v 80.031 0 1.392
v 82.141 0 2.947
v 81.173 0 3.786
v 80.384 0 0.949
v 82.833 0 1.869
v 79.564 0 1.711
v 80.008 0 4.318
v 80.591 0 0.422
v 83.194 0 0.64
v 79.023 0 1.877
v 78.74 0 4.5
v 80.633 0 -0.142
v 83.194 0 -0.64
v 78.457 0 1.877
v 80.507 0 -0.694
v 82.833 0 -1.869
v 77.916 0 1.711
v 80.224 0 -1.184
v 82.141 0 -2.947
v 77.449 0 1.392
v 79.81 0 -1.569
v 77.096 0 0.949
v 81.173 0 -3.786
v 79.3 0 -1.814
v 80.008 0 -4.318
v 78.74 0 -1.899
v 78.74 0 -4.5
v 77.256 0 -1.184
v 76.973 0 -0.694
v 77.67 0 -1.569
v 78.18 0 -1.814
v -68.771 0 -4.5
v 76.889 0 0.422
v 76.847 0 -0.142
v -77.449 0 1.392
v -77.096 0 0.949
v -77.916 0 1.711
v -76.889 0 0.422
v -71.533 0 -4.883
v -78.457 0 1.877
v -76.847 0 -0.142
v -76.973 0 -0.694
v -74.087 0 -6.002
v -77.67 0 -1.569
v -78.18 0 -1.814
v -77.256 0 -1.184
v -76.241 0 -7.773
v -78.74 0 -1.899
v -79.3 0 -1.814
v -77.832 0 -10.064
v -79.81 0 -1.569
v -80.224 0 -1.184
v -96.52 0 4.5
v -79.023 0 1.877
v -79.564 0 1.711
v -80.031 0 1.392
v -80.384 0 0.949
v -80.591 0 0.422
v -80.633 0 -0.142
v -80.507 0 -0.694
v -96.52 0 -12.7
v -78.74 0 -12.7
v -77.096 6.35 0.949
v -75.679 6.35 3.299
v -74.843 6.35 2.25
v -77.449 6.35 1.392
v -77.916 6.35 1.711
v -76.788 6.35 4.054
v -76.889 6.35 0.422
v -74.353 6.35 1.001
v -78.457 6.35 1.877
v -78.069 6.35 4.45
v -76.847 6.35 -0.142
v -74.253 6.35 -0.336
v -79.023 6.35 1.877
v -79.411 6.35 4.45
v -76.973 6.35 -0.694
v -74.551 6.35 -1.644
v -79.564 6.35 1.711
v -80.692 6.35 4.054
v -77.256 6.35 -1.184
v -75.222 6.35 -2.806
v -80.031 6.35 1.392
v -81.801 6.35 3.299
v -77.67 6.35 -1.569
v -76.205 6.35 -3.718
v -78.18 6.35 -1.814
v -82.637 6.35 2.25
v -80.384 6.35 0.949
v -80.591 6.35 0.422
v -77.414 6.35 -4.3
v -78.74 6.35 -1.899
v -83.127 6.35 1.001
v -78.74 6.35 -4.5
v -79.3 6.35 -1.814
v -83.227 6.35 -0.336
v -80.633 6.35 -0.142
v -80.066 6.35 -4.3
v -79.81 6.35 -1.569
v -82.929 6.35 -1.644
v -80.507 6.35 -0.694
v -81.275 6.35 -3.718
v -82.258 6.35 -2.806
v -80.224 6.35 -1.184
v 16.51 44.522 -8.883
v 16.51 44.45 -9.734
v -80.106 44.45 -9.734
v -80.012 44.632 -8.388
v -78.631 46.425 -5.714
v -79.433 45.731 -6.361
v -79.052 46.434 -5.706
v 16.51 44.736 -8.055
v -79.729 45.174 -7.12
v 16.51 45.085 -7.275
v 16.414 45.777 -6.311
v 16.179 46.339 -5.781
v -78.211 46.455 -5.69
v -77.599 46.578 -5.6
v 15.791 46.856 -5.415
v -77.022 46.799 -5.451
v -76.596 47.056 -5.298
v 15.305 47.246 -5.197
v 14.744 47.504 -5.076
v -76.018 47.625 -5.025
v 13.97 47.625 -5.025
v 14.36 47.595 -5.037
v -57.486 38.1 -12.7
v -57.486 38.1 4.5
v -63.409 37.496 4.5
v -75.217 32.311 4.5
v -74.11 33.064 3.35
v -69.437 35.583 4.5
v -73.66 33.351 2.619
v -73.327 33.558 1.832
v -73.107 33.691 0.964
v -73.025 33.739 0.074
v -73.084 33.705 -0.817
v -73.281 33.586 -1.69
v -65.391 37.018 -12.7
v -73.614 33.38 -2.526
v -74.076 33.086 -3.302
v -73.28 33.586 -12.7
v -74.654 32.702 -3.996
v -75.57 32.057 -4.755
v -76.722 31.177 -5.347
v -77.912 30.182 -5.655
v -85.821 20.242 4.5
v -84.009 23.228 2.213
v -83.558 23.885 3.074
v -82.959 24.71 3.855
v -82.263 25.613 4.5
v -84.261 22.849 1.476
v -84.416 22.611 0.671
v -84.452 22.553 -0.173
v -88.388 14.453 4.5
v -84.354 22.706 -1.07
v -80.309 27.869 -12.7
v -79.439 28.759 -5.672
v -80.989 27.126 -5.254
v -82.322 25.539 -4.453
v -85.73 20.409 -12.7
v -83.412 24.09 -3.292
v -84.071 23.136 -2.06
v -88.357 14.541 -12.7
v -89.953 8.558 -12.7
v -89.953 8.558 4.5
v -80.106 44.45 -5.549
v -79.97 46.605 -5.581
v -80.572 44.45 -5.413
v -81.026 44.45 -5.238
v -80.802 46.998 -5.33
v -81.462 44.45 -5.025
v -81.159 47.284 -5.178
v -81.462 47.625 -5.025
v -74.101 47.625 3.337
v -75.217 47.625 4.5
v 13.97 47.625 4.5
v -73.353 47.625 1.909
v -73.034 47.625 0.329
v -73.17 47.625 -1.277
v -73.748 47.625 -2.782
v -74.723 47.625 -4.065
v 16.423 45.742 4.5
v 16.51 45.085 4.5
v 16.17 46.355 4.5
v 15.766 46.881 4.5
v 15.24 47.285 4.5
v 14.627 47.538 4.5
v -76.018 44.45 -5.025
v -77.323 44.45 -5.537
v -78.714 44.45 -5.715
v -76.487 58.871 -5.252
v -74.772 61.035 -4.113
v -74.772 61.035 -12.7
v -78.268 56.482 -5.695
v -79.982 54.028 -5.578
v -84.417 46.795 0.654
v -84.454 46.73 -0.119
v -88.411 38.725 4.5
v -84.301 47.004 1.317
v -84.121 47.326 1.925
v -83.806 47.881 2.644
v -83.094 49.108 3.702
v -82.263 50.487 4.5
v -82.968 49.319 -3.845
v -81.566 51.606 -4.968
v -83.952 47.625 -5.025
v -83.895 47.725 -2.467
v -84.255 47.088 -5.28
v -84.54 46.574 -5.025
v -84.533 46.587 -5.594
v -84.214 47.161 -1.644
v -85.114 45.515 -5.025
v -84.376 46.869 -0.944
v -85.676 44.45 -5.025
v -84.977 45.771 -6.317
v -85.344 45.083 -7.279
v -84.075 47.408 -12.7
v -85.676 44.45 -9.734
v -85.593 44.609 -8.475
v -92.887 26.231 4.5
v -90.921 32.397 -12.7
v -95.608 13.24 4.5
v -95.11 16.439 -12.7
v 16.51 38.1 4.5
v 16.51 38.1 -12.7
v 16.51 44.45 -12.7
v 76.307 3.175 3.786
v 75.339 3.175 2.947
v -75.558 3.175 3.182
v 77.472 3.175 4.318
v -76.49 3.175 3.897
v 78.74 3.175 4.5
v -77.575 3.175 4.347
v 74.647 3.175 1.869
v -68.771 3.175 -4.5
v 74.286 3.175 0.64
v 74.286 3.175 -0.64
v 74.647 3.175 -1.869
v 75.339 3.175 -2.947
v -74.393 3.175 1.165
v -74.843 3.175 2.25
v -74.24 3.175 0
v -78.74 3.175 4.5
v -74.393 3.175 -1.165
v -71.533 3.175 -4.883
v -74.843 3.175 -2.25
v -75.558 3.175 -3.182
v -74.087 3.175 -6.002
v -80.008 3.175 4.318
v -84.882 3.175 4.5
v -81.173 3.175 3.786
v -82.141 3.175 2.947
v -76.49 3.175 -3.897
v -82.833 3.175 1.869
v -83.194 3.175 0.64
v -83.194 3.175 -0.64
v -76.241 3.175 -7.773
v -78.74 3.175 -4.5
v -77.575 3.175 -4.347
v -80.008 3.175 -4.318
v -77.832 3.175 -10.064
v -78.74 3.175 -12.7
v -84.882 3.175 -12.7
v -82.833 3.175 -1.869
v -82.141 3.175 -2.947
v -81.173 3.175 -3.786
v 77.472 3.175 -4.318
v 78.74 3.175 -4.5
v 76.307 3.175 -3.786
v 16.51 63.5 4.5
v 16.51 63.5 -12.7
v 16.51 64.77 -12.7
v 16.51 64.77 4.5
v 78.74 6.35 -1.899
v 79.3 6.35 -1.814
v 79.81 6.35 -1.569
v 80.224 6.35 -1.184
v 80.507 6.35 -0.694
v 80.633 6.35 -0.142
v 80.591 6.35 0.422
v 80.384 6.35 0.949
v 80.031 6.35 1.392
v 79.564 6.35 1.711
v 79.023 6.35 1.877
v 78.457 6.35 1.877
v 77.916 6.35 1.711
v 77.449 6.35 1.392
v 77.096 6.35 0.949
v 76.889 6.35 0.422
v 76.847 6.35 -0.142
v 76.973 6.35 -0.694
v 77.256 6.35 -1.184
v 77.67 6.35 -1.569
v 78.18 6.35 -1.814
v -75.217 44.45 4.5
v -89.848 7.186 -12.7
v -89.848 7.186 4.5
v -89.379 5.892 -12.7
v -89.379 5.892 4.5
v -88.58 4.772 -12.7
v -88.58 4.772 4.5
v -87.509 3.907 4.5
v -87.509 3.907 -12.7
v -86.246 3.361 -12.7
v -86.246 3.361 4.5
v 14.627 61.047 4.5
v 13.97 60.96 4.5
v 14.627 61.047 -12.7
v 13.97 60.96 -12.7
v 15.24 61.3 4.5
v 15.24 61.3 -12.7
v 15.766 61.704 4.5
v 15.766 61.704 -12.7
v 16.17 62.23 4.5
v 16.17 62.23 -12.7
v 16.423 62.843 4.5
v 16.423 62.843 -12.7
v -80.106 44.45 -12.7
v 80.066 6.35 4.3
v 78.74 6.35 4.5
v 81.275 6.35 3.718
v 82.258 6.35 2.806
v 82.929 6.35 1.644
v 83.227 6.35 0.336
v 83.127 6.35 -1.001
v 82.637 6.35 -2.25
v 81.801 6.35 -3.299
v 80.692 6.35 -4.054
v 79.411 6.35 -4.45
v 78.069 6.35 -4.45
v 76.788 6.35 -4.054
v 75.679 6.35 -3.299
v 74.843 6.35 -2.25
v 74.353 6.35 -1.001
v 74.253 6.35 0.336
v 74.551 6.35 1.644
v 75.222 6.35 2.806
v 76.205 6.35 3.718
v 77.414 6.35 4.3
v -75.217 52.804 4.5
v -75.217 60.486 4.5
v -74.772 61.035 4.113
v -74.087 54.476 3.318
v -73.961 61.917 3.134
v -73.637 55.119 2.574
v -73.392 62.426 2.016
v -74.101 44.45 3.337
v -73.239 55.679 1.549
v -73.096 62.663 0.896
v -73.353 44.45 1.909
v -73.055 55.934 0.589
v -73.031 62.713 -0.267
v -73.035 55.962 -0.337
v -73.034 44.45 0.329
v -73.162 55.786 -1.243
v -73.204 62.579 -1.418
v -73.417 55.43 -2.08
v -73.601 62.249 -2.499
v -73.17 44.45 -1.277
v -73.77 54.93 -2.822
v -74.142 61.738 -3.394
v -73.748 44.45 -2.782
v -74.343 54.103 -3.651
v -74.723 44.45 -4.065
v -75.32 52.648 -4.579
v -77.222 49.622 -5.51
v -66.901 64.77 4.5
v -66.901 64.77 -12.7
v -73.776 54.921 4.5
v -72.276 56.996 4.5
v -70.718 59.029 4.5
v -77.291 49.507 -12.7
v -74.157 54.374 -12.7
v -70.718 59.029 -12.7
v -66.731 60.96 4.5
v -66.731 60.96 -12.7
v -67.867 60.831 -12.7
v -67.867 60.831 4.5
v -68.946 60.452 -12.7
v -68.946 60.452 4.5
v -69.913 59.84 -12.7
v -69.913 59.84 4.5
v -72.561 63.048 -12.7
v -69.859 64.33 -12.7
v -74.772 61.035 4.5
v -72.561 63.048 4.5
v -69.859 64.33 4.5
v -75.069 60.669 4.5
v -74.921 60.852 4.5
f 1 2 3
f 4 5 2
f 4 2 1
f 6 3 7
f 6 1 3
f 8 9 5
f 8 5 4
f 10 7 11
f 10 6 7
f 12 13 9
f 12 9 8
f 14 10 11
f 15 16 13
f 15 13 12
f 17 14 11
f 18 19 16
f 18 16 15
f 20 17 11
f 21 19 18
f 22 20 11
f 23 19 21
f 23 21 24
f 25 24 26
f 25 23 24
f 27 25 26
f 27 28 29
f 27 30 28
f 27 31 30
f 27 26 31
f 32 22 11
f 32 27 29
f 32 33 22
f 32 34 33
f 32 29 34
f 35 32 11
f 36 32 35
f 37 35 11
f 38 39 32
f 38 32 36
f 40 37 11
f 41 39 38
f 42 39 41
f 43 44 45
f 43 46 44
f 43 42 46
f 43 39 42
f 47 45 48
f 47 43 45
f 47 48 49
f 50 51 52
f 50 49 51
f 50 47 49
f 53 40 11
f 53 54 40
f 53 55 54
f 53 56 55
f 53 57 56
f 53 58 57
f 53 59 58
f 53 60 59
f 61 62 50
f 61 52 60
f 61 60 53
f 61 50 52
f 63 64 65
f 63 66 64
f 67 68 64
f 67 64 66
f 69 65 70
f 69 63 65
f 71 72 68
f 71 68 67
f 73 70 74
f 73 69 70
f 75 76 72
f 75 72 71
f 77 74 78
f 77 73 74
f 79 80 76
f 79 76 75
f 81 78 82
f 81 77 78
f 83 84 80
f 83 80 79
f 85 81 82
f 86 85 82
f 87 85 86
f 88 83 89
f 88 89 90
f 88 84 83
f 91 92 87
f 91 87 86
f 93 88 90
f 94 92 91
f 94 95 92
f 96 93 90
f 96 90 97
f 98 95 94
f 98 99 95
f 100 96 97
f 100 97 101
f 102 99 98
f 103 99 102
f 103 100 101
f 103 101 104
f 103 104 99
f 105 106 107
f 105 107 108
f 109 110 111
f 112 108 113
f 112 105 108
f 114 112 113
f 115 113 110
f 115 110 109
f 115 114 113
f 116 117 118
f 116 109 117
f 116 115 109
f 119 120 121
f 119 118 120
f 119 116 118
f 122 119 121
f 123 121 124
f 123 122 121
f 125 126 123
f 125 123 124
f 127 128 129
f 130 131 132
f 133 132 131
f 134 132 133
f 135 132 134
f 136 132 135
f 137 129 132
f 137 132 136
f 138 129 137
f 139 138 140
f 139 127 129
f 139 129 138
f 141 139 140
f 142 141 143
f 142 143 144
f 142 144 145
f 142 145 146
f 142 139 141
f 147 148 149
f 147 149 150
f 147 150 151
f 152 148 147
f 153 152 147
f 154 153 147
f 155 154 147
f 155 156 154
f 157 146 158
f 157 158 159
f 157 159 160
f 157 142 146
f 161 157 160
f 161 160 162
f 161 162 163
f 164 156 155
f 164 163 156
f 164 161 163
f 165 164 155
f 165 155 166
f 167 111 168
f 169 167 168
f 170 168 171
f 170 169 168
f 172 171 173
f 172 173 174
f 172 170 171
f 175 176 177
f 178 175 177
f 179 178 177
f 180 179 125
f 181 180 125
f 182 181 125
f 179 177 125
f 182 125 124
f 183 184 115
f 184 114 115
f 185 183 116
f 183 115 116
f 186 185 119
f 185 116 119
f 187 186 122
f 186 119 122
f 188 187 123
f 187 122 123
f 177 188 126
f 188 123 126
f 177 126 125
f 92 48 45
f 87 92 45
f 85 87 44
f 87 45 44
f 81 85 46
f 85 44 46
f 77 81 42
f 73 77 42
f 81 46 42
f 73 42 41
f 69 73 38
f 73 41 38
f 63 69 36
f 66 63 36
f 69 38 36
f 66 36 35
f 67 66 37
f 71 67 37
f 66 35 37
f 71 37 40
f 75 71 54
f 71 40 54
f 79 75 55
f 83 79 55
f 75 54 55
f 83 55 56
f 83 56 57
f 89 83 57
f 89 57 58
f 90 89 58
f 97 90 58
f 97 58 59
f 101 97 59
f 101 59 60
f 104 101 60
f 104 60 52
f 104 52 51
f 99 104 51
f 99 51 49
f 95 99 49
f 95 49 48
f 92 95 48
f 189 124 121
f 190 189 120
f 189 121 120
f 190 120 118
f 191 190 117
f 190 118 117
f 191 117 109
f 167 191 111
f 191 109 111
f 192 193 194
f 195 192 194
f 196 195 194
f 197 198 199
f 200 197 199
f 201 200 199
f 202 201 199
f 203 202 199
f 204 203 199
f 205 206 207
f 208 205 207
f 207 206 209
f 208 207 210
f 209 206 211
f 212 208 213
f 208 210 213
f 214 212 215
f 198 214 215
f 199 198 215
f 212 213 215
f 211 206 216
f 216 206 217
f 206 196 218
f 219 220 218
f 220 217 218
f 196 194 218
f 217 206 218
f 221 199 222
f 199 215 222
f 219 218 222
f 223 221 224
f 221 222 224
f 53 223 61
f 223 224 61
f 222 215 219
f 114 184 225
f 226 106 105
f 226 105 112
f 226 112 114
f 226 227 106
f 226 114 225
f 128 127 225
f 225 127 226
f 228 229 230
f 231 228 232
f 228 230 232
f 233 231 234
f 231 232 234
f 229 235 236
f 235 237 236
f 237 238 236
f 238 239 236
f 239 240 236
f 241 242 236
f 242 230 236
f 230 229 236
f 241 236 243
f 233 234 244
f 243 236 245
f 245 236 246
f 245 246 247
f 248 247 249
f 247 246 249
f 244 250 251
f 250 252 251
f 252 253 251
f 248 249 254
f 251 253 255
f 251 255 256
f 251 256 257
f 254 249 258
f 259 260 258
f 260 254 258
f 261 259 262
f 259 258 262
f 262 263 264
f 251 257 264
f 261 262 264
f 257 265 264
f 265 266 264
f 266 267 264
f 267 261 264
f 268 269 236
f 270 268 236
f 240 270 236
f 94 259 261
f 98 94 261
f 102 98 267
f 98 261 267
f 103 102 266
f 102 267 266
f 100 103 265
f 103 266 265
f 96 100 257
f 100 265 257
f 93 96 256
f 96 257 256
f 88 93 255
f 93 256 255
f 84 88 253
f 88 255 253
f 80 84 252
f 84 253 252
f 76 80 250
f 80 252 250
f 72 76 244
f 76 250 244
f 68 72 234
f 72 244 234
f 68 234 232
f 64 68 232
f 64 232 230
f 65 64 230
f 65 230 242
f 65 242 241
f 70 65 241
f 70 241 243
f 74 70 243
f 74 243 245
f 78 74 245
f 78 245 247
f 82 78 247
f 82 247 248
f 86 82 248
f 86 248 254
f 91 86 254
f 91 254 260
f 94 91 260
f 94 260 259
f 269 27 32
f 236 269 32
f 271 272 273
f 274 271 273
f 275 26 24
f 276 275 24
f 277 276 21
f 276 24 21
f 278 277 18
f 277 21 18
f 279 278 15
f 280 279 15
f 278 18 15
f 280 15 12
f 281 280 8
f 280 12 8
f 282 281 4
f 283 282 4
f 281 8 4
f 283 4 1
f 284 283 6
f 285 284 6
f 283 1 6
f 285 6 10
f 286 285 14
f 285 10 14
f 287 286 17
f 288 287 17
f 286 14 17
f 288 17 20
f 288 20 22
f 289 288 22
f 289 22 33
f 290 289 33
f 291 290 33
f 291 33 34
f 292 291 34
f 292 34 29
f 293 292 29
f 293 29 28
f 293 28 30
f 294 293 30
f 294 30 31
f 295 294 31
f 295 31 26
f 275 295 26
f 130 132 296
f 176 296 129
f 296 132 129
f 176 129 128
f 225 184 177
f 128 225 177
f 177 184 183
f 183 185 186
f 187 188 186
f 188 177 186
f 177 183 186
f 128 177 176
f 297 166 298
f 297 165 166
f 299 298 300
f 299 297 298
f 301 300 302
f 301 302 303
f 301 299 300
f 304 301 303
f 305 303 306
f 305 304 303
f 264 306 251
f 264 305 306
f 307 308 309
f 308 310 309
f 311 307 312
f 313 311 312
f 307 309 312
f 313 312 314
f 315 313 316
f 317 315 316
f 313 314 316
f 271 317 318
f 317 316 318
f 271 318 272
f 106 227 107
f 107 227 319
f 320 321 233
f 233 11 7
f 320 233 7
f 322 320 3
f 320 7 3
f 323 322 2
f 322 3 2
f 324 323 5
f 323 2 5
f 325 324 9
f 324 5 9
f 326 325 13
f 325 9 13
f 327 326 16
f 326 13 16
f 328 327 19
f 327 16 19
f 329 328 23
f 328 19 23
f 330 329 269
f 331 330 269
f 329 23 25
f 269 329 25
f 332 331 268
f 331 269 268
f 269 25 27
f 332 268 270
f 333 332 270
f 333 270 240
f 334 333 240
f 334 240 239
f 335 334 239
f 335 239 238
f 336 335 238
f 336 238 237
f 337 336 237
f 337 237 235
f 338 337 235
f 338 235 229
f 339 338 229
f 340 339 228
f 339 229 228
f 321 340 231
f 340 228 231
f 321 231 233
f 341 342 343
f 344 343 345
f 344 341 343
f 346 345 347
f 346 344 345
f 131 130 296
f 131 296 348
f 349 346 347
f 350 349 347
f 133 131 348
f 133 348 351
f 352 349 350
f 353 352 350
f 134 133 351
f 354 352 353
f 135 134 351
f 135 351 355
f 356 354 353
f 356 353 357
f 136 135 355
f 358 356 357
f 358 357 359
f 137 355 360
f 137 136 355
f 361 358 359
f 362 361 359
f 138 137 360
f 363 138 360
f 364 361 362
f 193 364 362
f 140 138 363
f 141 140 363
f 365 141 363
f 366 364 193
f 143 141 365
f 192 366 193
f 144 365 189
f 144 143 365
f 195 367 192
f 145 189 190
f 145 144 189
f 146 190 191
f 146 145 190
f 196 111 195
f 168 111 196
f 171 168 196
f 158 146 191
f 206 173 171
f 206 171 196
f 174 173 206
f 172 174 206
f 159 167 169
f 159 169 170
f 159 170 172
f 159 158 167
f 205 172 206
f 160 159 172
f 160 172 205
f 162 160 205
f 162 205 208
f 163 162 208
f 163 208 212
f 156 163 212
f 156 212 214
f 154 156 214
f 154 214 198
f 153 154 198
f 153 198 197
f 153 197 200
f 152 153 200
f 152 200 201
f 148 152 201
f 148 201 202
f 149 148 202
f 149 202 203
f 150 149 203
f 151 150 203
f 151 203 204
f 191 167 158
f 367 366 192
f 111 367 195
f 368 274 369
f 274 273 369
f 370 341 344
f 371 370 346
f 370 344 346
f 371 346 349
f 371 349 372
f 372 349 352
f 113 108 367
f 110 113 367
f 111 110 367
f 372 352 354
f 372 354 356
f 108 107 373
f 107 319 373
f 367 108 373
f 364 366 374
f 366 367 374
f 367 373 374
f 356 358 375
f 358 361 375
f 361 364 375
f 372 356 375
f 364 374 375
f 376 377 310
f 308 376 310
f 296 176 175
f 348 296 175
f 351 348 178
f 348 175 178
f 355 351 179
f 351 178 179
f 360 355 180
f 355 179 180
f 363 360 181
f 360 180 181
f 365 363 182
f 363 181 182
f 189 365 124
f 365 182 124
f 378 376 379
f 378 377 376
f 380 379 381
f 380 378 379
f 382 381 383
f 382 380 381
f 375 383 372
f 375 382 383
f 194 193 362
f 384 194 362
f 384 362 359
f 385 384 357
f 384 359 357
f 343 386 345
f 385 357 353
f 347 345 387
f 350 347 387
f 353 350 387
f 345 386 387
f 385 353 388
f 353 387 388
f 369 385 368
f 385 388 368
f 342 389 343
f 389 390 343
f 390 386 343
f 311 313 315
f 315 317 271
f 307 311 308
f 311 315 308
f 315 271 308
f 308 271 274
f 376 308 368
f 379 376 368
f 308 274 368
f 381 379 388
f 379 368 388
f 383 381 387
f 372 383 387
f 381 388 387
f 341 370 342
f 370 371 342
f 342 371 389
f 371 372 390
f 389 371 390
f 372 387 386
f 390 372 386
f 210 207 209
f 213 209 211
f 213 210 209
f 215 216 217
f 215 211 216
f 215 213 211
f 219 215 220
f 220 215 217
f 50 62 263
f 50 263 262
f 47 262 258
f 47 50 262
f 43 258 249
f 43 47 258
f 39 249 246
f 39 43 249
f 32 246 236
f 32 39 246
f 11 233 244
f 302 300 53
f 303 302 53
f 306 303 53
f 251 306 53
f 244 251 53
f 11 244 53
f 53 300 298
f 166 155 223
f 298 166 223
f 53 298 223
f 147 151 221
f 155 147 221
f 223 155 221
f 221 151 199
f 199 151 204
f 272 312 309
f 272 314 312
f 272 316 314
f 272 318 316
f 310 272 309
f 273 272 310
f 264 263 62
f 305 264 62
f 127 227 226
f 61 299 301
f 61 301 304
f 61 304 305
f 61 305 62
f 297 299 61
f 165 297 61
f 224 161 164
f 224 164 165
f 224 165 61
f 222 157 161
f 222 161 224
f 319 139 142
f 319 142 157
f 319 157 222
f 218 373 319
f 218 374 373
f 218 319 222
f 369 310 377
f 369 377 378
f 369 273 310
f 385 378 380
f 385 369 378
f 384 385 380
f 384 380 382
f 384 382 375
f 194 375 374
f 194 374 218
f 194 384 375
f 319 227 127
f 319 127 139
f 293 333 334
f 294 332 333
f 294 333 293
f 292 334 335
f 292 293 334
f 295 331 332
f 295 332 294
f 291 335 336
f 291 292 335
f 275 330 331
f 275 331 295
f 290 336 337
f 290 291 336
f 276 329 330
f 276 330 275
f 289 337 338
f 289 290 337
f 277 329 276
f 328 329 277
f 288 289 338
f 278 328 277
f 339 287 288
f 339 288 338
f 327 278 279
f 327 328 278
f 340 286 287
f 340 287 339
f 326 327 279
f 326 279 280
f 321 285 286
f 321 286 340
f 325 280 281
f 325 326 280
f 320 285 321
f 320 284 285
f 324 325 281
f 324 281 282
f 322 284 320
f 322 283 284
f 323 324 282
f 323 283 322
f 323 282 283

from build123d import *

# Parameters (mm, degrees)
SKETCH1_R                       = 4.5
BOSS_EXTRUDE1_DEPTH             = 6.35
BOSS_EXTRUDE1_2_DEPTH           = 6.35
BOSS_EXTRUDE2_DEPTH             = 3.175
BOSS_EXTRUDE3_DEPTH             = 12.7
BOSS_EXTRUDE3_DIRECTION_2_REACH = 85.603
FILLET1_R                       = 5.08
FILLET2_R                       = 10.16
F_6_CLEARANCE_HOLE1_D           = 3.7973
F_6_CLEARANCE_HOLE1_DEPTH       = 6.35
FILLET5_START                   = -12.7
FILLET5_DEPTH                   = 17.2
CUT_EXTRUDE1_START              = -56.211523666
CUT_EXTRUDE1_DEPTH              = 56.211523666
BOSS_EXTRUDE5_REACH             = 132.89
BOSS_EXTRUDE5_END_RADIUS        = 5.715
SKETCH8_W                       = 9.525
SKETCH8_H                       = 3.175
FILLET6_R                       = 5.08
FILLET7_R                       = 2.54


with BuildPart() as part:
    # Sketch1 → Boss-Extrude1 (new body)
    with BuildSketch(Plane(origin=(0, 0, 0), x_dir=(1, 0, 0), z_dir=(0, 1, 0))):
        with Locations(Location((78.74, 0, 0), (0, 0, 270))):
            Circle(SKETCH1_R)
    extrude(amount=BOSS_EXTRUDE1_DEPTH)



with BuildPart() as body_2:
    # Sketch1 → Boss-Extrude1 2 (new body)
    with BuildSketch(Plane(origin=(0, 0, 0), x_dir=(1, 0, 0), z_dir=(0, 1, 0))):
        with Locations(Location((-78.74, 0, 0), (0, 0, 90))):
            Circle(SKETCH1_R)
    extrude(amount=BOSS_EXTRUDE1_2_DEPTH)


with BuildPart() as part_1:
    add(part.part)

    add(body_2.part)  # Boss-Extrude2 merges body 2
    # Sketch2 → Boss-Extrude2 (add)
    with BuildSketch(Plane(origin=(0, 0, 0), x_dir=(1, 0, 0), z_dir=(0, 1, 0))):
        with BuildLine():
            Line((78.74, 4.5), (-78.74, 4.5))
            ThreePointArc((-78.74, 4.5), (-75.558019485, 3.181980515), (-74.24, 0))
            ThreePointArc((-74.24, 0), (-75.558019485, -3.181980515), (-78.74, -4.5))
            Line((-78.74, -4.5), (78.74, -4.5))
            ThreePointArc((78.74, -4.5), (74.24, 0), (78.74, 4.5))
        make_face()
    extrude(amount=BOSS_EXTRUDE2_DEPTH)

    # Sketch3 → Boss-Extrude3 (add)
    with BuildSketch(Plane.XY):
        with BuildLine():
            Line((-78.74, 0), (-78.74, 3.175))
            Line((-78.74, 3.175), (-90.114089339, 3.175))
            ThreePointArc((-90.114089339, 3.175), (-88.335814095, 20.989027697), (-83.071170469, 38.1))
            Line((-83.071170469, 38.1), (16.51, 38.1))
            Line((16.51, 38.1), (16.51, 44.45))
            Line((16.51, 44.45), (-80.105931514, 44.45))
            ThreePointArc((-80.105931514, 44.45), (-75.082403553, 53.007088382), (-69.148535375, 60.96))
            Line((-69.148535375, 60.96), (16.51, 60.96))
            Line((16.51, 60.96), (16.51, 64.77))
            Line((16.51, 64.77), (-71.560865702, 64.77))
            ThreePointArc((-71.560865702, 64.77), (-90.064324673, 34.70630809), (-96.52, 0))
            Line((-96.52, 0), (-78.74, 0))
        make_face()
    extrude(amount=-BOSS_EXTRUDE3_DEPTH)

    # Boss-Extrude3 direction 2: up to this face of the body (flat: up to its plane)
    boss_extrude3_direction_2_end = Plane(part_1.part.faces().sort_by_distance((0, 1.5875, 4.5))[0])
    # Sketch3 → Boss-Extrude3 direction 2 (add, up to the picked face)
    with BuildSketch(Plane.XY, mode=Mode.PRIVATE) as boss_extrude3_direction_2_sk1:
        with BuildLine():
            Line((-78.74, 0), (-78.74, 3.175))
            Line((-78.74, 3.175), (-90.114089339, 3.175))
            ThreePointArc((-90.114089339, 3.175), (-88.335814095, 20.989027697), (-83.071170469, 38.1))
            Line((-83.071170469, 38.1), (16.51, 38.1))
            Line((16.51, 38.1), (16.51, 44.45))
            Line((16.51, 44.45), (-80.105931514, 44.45))
            ThreePointArc((-80.105931514, 44.45), (-75.082403553, 53.007088382), (-69.148535375, 60.96))
            Line((-69.148535375, 60.96), (16.51, 60.96))
            Line((16.51, 60.96), (16.51, 64.77))
            Line((16.51, 64.77), (-71.560865702, 64.77))
            ThreePointArc((-71.560865702, 64.77), (-90.064324673, 34.70630809), (-96.52, 0))
            Line((-96.52, 0), (-78.74, 0))
        make_face()
    boss_extrude3_direction_2_tool1 = split(extrude(boss_extrude3_direction_2_sk1.sketch, amount=BOSS_EXTRUDE3_DIRECTION_2_REACH, mode=Mode.PRIVATE), bisect_by=boss_extrude3_direction_2_end, keep=Keep.BOTH, mode=Mode.PRIVATE)
    add(boss_extrude3_direction_2_tool1.solids().sort_by(Axis((-47.115631, 42.638129, 0), (0, 0, 1)))[0])

    # Fillet1
    fillet1_edges = [part_1.edges().sort_by_distance(p)[0] for p in [
        (-69.148535375, 60.96, -4.1),
        (-90.114089339, 3.175, -4.1),
    ]]
    fillet(fillet1_edges, radius=FILLET1_R)

    # Fillet2
    # the kernel refuses this fillet: 10.16 mm, written as the material it adds along each edge
    with BuildSketch(Plane(origin=(-78.74, 0, -4.5), x_dir=(1, 0, 0), z_dir=(0, 1, 0))) as fillet2_piece_1:
        with BuildLine():
            CenterArc((9.969152421, 10.16), FILLET2_R, 191.12285511, 78.87714489)
            Line((0, 8.2), (0, 0))
            Line((0, 0), (9.969152421, 0))
        make_face()
    extrude(amount=3.175)
    # the kernel refuses this fillet: 10.16 mm, written as the material it takes off along each edge
    with BuildSketch(Plane(origin=(-71.560865702, 64.77, 16.814827808), x_dir=(1, 0, 0), z_dir=(0, 0, -1))) as fillet2_2_piece_1:
        with BuildLine():
            CenterArc((4.659464371, 10.16), FILLET2_R, 219.223932399, 50.776067601)
            ThreePointArc((-3.211288726, 3.735294118), (-1.629477245, 1.847157571), (0, 0))
            Line((0, 0), (4.659464371, 0))
        make_face()
    extrude(amount=41.829655616, mode=Mode.SUBTRACT)

    # #6 Clearance Hole1
    with Locations(Plane(origin=(-78.74, 6.35, 0), x_dir=(0, 0, 1), z_dir=(0, 1, 0))):
        with Locations((0, 0), (0, 157.48)):
            Hole(F_6_CLEARANCE_HOLE1_D / 2, depth=F_6_CLEARANCE_HOLE1_DEPTH)

    # Fillet5: read off the stored shape, not the designer's step
    # Fillet5 outline → Fillet5 (add)
    with BuildSketch(Plane.XY.offset(FILLET5_START)):
        with BuildLine():
            add(Edge.make_bspline(
                [(-57.486261954, 38.1), (-84.476947832, 38.1), (-89.953142639, 8.558476434)],
                knots=[0, 0, 0, 1, 1, 1], degree=2, weights=[1, 0.768852264, 1]))
            Line((-57.486261954, 38.1), (-83.071170469, 38.1))
            ThreePointArc((-83.071170469, 38.1), (-87.76402471, 23.620872526), (-89.953142639, 8.558476434))
        make_face()
    extrude(amount=FILLET5_DEPTH)

    # Cut-Extrude1: read off the stored shape, not the designer's step
    # Cut-Extrude1 outline → Cut-Extrude1 (cut)
    with BuildSketch(Plane(origin=(0, 64.77, 0), x_dir=(1, 0, 0), z_dir=(0, 1, 0)).offset(CUT_EXTRUDE1_START)):
        with BuildLine():
            Line((-82.262956855, -4.5), (-75.217043145, -4.5))
            ThreePointArc((-75.217043145, -4.5), (-78.74, 5.715), (-82.262956855, -4.5))
        make_face()
    extrude(amount=CUT_EXTRUDE1_DEPTH, mode=Mode.SUBTRACT)

    # Boss-Extrude5: up to this cylinder (the profile starts outside it)
    boss_extrude5_end = Plane(origin=(-78.74, 46.0375, 0), z_dir=(0, 1, 0)) * Cylinder(BOSS_EXTRUDE5_END_RADIUS, 278.21, mode=Mode.PRIVATE)
    # Sketch8 → Boss-Extrude5 (add, up to the surface)
    with BuildSketch(Plane(origin=(16.51, 0, 0), x_dir=(0, 0, -1), z_dir=(1, 0, 0)), mode=Mode.PRIVATE) as boss_extrude5_sk1:
        with Locations((0.2625, 46.0375)):
            Rectangle(SKETCH8_W, SKETCH8_H)
    boss_extrude5_tool1 = extrude(boss_extrude5_sk1.sketch, amount=-BOSS_EXTRUDE5_REACH, mode=Mode.PRIVATE) - boss_extrude5_end
    add(boss_extrude5_tool1.solids().sort_by_distance((16.51, 46.0375, -0.2625))[0])

    # Fillet6
    # the kernel refuses this fillet: 5.08 mm, written as the material it adds along each edge
    with BuildSketch(Plane(origin=(16.51, 44.45, -5.025), x_dir=(0, 1, 0), z_dir=(-1, 0, 0))) as fillet6_piece_1_section:
        with BuildLine():
            CenterArc((5.08, 4.709286039), FILLET6_R, 180, 67.975687163)
            Line((0, 4.709286039), (0, 0))
            Line((0, 0), (3.175, 0))
        make_face()
    fillet6_piece_1 = extrude(amount=104.300973375, mode=Mode.PRIVATE)
    fillet6_piece_1 = fillet6_piece_1 - Plane(origin=(-78.74, 44.45, 0), x_dir=(1, 0, 0), z_dir=(0, 1, 0)) * Cylinder(5.715, 228, mode=Mode.PRIVATE)
    fillet6_piece_1 = fillet6_piece_1 & Plane(origin=(0, 0, -5.025), x_dir=(-0.7414097151042524, 0.671052631578948, 0), z_dir=(0, 0, 1)) * Cylinder(96.52, 228, mode=Mode.PRIVATE)
    add(fillet6_piece_1)

    # Fillet7
    fillet7_edges = [part_1.edges().sort_by_distance(p)[0] for p in [
        (16.51, 47.625, -0.2625),
        (16.51, 60.96, -4.1),
    ]]
    fillet(fillet7_edges, radius=FILLET7_R)


solid = part_1.part
